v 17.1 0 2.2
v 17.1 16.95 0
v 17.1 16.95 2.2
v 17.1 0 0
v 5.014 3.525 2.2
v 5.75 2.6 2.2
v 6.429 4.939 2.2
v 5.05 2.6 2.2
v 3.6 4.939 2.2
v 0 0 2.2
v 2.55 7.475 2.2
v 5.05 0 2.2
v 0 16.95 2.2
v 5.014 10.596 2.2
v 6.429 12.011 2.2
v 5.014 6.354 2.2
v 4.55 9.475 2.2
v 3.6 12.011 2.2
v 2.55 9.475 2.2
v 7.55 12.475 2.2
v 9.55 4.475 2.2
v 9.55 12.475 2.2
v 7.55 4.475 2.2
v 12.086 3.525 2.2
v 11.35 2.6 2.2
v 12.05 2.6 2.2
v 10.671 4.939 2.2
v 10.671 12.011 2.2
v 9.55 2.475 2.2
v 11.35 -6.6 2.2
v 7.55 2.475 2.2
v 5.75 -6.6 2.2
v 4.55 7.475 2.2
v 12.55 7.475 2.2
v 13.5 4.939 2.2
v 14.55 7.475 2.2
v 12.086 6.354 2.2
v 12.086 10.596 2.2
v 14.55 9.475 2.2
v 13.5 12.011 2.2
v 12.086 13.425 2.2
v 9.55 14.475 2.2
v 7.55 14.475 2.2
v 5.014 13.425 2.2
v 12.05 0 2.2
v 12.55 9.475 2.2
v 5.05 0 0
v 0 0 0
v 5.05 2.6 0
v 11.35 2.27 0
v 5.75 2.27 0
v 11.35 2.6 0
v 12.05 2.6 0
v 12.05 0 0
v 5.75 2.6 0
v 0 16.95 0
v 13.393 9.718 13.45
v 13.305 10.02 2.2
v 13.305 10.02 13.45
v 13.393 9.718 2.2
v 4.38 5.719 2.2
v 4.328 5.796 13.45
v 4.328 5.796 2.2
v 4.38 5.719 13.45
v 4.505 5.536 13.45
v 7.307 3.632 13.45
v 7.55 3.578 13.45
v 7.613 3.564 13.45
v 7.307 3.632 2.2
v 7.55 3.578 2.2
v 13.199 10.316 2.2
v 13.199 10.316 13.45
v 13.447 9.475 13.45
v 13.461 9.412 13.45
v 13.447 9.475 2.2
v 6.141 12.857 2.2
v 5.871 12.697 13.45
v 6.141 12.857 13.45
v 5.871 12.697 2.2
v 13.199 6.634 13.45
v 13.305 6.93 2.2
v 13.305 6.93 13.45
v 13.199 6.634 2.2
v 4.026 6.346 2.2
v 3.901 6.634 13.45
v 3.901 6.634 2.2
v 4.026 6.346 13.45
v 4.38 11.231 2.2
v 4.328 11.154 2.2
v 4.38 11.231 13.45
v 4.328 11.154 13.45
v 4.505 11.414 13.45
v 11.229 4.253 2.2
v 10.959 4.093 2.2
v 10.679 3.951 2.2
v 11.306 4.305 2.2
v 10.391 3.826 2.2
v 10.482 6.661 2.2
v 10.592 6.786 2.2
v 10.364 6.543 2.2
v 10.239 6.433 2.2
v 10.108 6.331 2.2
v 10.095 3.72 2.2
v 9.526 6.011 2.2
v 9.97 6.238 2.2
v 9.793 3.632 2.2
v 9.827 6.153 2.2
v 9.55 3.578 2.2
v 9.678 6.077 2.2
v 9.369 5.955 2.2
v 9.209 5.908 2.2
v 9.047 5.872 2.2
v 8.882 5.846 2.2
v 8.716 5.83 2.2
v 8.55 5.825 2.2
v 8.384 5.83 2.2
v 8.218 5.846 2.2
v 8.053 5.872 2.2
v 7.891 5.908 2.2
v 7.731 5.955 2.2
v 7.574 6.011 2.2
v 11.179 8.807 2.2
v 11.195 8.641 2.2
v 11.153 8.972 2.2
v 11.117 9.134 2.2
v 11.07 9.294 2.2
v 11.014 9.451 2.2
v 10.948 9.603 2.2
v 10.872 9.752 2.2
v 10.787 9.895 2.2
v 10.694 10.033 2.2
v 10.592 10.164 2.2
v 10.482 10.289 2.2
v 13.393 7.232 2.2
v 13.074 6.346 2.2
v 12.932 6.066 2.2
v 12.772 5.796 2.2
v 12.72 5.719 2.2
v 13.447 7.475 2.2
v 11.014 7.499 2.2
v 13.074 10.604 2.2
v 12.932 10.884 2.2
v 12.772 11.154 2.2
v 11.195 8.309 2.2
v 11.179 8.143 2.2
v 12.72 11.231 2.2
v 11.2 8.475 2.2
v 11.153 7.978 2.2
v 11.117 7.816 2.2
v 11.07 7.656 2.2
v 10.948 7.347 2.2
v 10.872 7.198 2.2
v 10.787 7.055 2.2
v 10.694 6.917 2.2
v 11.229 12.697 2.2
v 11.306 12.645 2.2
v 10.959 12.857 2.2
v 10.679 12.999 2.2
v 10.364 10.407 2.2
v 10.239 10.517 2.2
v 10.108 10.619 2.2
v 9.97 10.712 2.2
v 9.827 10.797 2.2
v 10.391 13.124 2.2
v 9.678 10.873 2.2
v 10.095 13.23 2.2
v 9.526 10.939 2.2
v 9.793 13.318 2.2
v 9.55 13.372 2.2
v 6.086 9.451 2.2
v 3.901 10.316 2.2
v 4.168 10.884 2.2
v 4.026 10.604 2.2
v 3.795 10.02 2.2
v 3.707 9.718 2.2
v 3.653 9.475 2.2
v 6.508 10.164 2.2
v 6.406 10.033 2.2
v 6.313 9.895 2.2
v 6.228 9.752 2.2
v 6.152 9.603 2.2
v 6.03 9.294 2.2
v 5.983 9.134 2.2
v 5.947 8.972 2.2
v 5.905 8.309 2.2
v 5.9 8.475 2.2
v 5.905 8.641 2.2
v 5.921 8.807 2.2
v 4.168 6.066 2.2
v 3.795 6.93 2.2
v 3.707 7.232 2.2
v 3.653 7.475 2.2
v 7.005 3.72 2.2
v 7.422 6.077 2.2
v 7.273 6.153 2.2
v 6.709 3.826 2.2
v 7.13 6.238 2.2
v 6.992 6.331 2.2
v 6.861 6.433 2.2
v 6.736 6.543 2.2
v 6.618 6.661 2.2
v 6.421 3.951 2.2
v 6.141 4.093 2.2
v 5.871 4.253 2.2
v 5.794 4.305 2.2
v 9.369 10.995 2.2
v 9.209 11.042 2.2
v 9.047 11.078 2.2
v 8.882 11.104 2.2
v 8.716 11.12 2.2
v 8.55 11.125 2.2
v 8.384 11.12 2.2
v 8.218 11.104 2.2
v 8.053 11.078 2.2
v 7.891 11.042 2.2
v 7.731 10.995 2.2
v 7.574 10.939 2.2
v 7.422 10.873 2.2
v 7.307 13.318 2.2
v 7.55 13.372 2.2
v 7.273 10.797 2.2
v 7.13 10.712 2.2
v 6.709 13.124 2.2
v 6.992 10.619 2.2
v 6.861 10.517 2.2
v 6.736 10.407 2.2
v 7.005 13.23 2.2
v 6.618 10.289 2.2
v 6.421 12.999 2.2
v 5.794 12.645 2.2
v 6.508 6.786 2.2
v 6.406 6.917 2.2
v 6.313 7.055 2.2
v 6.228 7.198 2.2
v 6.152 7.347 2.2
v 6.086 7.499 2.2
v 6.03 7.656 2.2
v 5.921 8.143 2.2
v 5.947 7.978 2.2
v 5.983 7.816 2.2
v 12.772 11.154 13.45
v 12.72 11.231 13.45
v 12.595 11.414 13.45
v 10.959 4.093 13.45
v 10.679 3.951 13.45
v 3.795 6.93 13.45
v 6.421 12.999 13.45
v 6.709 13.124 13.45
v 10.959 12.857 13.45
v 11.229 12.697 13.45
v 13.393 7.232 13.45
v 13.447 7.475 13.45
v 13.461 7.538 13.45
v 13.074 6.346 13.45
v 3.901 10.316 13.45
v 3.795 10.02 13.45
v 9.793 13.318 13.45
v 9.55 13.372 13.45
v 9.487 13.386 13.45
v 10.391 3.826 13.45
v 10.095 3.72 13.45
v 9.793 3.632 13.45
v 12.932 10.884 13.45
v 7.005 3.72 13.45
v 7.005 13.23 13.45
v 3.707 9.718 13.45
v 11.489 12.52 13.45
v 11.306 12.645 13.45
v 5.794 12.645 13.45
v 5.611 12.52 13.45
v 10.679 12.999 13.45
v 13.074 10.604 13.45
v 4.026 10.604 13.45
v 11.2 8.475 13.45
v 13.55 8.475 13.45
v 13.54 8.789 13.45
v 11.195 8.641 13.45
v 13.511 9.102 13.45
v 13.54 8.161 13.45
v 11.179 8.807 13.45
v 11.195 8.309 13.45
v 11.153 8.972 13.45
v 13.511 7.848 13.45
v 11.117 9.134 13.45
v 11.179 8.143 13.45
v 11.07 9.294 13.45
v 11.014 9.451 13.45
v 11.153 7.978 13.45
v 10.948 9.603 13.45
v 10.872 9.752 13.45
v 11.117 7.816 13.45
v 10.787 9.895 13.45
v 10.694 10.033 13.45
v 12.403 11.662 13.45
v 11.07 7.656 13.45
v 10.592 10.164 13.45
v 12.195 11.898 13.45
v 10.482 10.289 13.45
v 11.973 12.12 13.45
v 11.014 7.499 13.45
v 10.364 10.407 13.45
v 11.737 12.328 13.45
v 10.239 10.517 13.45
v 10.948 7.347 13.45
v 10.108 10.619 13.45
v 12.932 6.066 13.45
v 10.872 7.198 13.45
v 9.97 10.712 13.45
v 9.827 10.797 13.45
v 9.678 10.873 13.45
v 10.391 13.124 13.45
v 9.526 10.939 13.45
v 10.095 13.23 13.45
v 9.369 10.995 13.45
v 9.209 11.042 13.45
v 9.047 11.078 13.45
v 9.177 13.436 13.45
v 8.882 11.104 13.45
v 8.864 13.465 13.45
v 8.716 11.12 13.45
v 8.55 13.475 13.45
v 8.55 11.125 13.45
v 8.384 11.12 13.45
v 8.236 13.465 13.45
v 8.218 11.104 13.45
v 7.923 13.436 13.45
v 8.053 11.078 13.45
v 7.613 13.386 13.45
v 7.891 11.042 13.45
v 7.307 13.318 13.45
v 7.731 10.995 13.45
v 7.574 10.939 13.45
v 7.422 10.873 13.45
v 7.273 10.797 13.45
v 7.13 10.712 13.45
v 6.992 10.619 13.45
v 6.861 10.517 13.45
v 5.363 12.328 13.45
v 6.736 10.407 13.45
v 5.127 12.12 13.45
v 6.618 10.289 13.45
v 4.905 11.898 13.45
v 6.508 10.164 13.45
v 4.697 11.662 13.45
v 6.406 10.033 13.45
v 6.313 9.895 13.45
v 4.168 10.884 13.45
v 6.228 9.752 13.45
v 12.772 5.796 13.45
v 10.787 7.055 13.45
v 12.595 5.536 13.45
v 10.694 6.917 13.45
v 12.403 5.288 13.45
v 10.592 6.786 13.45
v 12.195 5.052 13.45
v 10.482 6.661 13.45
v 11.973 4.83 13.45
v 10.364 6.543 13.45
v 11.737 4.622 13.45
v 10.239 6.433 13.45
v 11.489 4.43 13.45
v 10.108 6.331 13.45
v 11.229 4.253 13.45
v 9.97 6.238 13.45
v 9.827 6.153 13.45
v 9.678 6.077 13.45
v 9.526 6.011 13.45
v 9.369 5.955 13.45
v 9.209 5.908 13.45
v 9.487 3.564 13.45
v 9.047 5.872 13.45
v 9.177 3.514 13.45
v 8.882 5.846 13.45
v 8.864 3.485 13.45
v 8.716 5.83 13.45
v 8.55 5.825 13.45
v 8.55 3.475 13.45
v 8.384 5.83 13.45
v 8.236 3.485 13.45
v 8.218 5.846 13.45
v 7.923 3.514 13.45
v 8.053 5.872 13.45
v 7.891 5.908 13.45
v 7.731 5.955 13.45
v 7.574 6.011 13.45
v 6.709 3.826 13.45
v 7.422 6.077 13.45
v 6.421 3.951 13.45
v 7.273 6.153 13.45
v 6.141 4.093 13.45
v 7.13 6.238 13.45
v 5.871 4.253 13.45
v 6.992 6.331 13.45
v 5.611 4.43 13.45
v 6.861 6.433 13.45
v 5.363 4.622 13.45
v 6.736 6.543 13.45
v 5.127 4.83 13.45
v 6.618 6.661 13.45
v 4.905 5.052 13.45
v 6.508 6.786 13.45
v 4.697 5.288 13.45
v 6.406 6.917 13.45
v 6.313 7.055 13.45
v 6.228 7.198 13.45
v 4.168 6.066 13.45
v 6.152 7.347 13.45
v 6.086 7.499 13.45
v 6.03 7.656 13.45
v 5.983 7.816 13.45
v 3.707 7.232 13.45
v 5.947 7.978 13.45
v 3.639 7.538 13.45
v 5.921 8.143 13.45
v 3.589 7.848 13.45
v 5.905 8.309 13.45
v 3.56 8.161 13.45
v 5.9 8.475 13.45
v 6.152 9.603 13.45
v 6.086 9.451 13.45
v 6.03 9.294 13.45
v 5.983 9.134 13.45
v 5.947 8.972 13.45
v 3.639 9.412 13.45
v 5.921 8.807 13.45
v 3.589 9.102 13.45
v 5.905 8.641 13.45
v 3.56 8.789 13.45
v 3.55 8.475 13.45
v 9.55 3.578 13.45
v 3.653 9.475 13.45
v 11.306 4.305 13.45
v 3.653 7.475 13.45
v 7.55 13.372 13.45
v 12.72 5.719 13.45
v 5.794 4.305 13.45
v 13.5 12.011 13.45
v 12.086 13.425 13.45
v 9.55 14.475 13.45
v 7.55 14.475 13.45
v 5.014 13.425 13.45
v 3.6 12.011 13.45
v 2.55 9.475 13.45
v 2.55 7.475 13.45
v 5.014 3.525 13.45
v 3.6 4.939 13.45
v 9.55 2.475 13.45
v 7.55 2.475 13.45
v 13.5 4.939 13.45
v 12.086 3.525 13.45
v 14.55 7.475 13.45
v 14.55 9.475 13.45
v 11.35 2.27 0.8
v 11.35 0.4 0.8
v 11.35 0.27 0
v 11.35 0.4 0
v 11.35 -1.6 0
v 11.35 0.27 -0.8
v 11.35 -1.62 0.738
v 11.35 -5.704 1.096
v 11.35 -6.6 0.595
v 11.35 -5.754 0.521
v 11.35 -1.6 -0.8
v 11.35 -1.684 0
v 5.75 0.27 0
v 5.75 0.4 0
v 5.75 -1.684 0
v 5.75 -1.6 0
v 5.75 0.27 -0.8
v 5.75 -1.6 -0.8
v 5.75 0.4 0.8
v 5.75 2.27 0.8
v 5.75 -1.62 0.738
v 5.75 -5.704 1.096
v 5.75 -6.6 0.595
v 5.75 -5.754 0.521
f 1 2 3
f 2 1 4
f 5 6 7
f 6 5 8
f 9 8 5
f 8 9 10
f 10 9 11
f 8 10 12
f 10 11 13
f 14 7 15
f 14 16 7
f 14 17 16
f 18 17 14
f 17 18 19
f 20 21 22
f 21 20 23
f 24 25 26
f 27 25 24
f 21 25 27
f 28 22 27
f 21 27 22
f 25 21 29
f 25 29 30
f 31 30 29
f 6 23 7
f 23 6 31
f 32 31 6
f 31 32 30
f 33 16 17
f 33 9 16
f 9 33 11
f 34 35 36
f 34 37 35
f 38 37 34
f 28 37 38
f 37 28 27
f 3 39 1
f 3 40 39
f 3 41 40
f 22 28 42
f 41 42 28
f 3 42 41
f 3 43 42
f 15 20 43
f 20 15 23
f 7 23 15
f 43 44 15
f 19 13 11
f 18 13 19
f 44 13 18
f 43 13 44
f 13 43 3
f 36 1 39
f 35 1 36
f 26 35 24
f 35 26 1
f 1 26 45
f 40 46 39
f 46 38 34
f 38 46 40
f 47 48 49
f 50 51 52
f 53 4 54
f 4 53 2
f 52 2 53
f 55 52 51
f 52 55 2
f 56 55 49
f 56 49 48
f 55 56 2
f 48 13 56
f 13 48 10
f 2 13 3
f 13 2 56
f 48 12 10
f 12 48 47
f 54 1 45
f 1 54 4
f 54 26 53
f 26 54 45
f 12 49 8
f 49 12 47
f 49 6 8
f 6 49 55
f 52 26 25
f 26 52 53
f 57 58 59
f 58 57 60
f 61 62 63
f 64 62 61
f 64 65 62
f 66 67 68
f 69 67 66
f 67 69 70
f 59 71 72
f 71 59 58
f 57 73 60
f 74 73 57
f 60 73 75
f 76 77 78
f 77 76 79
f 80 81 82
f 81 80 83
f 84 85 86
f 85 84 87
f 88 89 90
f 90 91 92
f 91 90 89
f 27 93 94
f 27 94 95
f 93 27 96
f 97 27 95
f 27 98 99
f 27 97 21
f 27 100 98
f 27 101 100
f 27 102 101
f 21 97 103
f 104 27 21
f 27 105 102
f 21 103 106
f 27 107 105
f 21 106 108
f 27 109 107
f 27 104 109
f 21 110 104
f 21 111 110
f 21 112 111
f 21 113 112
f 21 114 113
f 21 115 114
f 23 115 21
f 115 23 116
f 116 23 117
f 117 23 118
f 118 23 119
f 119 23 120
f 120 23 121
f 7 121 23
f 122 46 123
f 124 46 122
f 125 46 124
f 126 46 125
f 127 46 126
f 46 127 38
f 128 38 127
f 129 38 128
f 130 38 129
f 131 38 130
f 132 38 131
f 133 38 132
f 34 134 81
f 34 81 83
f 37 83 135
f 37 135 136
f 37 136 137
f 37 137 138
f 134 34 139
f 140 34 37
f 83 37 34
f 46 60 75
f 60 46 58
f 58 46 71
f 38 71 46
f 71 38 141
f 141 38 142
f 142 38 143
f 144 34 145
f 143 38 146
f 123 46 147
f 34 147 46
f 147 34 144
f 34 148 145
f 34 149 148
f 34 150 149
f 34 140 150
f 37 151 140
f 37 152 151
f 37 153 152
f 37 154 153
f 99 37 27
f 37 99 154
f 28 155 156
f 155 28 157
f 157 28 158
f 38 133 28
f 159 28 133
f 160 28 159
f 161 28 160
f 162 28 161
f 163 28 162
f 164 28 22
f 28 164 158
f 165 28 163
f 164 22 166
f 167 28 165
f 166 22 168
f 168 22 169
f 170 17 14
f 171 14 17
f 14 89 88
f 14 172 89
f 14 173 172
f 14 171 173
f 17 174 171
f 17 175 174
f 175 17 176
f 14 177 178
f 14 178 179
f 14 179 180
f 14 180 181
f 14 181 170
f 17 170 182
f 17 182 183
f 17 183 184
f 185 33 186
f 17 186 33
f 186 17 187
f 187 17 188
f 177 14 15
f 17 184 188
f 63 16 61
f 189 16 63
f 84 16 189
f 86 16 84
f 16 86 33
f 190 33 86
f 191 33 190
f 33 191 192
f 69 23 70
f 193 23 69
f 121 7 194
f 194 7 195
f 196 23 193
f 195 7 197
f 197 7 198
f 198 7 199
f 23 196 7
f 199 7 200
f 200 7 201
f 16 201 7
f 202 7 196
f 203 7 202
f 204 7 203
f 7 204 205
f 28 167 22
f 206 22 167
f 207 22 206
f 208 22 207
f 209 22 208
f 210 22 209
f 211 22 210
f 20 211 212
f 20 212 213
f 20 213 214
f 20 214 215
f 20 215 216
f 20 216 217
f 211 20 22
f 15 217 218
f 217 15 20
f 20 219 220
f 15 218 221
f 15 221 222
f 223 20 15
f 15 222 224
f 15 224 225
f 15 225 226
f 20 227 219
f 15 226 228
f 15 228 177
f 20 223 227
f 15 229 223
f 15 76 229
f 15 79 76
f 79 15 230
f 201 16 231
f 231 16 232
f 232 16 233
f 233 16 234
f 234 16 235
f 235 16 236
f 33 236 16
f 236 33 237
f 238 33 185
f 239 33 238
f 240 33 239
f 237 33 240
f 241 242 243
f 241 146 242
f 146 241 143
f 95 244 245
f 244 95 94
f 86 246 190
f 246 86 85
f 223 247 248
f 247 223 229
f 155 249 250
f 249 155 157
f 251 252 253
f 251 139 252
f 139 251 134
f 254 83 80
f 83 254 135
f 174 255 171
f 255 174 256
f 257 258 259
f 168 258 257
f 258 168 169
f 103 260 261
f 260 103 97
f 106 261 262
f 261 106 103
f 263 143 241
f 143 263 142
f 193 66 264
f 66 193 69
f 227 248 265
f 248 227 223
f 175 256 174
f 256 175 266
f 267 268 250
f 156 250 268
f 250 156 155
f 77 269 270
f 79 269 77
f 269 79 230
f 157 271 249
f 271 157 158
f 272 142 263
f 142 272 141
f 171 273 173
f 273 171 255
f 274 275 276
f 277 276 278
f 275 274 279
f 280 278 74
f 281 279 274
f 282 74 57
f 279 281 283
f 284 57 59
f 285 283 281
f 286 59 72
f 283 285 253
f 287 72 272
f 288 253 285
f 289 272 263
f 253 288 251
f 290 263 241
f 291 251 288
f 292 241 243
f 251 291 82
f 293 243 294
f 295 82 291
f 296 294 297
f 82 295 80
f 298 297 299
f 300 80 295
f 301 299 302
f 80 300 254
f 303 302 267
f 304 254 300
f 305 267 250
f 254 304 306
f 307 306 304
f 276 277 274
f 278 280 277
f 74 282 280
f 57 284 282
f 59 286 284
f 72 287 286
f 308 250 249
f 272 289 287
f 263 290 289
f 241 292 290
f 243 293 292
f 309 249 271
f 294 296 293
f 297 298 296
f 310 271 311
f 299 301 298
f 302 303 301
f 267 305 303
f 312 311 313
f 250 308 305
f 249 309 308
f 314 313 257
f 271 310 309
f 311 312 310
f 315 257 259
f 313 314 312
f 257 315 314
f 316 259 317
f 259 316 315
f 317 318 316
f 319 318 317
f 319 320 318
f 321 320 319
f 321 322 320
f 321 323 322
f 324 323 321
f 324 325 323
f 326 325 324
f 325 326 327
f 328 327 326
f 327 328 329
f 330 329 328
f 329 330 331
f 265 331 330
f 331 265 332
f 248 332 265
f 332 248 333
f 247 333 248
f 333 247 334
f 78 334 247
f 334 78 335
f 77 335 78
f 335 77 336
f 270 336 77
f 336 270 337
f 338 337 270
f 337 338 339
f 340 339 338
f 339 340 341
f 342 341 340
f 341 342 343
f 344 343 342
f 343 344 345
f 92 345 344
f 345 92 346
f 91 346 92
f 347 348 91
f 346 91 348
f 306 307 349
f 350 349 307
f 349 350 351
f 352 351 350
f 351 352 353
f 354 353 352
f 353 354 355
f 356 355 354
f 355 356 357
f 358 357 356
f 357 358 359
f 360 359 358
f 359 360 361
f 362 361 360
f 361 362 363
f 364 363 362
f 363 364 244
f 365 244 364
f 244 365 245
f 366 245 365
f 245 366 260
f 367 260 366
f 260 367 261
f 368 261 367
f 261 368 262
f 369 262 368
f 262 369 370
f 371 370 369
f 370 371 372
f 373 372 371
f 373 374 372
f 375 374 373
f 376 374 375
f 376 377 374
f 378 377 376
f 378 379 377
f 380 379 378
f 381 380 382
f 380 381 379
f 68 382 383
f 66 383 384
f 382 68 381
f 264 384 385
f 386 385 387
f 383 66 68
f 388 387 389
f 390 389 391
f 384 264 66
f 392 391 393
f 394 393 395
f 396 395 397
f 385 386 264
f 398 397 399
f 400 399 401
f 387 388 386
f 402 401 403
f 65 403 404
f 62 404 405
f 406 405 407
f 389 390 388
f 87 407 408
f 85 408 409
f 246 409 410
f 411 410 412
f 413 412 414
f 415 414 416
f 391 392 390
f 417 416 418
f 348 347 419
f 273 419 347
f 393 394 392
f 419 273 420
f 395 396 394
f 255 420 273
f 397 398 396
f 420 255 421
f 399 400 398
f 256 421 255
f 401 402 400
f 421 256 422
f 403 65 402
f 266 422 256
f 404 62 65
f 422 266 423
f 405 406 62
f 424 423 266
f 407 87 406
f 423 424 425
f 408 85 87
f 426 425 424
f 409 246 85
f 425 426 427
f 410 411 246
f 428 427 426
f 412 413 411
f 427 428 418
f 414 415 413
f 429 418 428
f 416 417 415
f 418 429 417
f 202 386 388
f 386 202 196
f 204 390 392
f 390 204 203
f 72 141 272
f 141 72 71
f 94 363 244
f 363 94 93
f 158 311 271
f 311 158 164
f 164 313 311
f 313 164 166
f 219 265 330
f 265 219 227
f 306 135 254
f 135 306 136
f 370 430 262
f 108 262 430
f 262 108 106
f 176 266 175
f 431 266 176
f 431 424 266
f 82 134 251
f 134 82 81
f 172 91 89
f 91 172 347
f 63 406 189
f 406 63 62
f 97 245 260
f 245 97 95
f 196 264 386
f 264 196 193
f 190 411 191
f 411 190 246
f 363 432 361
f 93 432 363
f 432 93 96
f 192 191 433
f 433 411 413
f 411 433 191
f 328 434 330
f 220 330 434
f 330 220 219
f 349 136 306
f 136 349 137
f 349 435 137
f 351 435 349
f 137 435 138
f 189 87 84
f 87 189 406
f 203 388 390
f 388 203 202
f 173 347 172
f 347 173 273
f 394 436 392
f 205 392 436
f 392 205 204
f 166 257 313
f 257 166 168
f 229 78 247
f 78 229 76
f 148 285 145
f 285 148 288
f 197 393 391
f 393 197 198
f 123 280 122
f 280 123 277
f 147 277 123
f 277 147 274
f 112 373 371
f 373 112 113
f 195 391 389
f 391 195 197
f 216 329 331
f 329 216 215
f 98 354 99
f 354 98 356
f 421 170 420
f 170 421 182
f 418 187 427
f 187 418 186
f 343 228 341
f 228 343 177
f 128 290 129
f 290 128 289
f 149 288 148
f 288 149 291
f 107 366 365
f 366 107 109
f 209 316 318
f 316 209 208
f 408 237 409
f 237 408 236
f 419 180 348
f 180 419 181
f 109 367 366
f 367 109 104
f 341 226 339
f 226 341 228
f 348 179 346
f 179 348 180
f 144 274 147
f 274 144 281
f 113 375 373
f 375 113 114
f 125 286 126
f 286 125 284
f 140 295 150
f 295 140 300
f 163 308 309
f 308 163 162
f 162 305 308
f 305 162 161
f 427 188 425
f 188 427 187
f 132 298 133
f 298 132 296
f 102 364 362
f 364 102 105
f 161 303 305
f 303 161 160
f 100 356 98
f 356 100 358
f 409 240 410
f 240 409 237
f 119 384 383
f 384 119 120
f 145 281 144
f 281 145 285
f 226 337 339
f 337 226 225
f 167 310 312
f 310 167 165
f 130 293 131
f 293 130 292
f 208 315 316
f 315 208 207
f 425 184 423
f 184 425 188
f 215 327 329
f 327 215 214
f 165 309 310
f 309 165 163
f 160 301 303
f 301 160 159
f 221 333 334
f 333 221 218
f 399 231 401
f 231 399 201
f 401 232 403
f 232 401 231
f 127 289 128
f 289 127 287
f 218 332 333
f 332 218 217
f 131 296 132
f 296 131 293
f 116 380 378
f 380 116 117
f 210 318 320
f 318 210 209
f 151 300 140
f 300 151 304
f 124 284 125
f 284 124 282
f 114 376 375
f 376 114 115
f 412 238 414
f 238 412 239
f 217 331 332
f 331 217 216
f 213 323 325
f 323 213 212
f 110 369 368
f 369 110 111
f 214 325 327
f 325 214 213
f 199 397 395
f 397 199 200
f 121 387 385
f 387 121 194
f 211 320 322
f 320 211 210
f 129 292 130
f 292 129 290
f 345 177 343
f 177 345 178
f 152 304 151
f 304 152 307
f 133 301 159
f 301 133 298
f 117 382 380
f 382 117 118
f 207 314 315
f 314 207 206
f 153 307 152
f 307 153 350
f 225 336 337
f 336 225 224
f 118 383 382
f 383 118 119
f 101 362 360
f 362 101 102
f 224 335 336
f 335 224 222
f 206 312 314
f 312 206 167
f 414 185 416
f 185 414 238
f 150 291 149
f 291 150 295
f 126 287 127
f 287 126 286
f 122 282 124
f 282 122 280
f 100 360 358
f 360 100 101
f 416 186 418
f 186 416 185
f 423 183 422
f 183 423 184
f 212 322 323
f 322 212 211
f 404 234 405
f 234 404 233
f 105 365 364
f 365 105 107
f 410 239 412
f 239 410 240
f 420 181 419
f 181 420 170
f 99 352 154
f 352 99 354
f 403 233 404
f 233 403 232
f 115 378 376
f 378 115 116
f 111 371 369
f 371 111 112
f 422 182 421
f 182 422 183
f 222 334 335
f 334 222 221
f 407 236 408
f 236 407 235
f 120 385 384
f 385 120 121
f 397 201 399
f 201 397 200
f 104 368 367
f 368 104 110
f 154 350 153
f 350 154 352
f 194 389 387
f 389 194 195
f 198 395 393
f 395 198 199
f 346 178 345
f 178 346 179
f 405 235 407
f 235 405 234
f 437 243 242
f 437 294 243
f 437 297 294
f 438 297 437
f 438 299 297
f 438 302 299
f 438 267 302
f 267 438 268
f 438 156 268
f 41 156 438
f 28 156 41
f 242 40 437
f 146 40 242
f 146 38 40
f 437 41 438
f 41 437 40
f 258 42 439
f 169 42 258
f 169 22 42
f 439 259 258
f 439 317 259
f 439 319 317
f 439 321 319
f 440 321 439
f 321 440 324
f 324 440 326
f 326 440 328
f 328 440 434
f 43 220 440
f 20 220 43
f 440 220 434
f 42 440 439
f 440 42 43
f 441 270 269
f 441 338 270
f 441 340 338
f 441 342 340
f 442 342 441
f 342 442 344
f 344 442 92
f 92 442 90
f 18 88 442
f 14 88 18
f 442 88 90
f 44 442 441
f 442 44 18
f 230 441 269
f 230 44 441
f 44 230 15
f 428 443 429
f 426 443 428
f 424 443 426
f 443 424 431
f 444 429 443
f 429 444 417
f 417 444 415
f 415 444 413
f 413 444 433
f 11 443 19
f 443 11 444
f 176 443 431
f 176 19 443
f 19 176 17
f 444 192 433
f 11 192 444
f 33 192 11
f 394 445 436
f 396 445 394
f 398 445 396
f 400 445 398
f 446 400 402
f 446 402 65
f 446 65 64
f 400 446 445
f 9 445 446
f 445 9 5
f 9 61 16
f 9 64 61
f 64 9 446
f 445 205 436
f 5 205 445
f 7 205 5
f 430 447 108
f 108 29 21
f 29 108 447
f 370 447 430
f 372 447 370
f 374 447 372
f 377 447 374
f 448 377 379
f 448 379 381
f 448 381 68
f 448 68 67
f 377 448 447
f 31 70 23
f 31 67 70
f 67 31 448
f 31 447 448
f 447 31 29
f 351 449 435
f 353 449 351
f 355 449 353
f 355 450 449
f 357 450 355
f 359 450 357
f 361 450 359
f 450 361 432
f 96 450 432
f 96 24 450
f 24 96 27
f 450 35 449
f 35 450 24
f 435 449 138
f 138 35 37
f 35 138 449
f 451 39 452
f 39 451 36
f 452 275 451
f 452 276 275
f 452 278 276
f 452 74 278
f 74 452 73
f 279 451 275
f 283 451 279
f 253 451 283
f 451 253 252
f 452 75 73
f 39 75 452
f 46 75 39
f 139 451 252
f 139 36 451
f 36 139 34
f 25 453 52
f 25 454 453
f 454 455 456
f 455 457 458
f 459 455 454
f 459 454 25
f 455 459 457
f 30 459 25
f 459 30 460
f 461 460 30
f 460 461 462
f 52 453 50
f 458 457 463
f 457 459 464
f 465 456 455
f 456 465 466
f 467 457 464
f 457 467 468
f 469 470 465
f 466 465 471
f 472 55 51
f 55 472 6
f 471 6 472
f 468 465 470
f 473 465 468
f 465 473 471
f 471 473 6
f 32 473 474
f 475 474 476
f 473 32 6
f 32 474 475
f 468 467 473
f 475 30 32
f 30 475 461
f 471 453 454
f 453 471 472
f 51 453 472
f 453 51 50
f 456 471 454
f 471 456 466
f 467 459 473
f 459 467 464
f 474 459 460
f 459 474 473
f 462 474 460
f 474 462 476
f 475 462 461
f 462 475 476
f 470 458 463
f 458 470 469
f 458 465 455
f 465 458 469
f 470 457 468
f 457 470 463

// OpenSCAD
/*
 * Sunblinds holder
 * (c) 2020 David Mikulik
 * Licensed under 
 *   Creative Commons 
 *   Attribution Non Comercial Share alike license
 */
 
 $fn=100;
 PI=0+3.1415926;
 
 // MAIN CUBE 
 difference() {
    cube([17.1,16.95,2.2]);
    translate ([10.1/2,0,0]) {
        cube([7,2.6,2.2]);
    }
 }
 
 // TUBE
 translate ([17.1/2,16.95/2,2.2]) {
     difference() {
         cylinder (h=13.45-2.2, r=5);
         cylinder (h=13.45-2.2, r=5.3/2);
     }
 }
 
 // TUBE TOOTHS
 translate ([17.1/2,16.95/2,6.9]) {     
     for (i = [1:8]) {
        th = 360 / 8 * i;
        translate([(5)*cos(th), (5)*sin(th), 0]) {
            echo (th%90==0?45:0);
                rotate ([0,0,th%90]) {
                    {
                        cube(size=[2,2,17.1-4], center=true);
                    }
                }
        }
    }
}
// LOCK
translate ([(17.1-5.6)/2,-9.2+2.6,0]) {
    difference () 
        {
        cube([5.6,9.2,2.2]);
        translate ([-5/2,7,0]) {
            cube([9.2,1.87, 0.8]);
        }
        translate ([0,0.8,0]) {
            rotate ([-5,0,0]) {
                cube([5.6,4.1, 1.1]);
            }
        }
        translate ([0,-0.1,-.5]) {
            rotate ([-5,0,0]) {
                cube([5.6,4.1, 1.1]);
            }
        }
        
    }
    translate ([0,5,-.8]) {
        cube([5.6,1.87, 0.8]);
    }
}
 
